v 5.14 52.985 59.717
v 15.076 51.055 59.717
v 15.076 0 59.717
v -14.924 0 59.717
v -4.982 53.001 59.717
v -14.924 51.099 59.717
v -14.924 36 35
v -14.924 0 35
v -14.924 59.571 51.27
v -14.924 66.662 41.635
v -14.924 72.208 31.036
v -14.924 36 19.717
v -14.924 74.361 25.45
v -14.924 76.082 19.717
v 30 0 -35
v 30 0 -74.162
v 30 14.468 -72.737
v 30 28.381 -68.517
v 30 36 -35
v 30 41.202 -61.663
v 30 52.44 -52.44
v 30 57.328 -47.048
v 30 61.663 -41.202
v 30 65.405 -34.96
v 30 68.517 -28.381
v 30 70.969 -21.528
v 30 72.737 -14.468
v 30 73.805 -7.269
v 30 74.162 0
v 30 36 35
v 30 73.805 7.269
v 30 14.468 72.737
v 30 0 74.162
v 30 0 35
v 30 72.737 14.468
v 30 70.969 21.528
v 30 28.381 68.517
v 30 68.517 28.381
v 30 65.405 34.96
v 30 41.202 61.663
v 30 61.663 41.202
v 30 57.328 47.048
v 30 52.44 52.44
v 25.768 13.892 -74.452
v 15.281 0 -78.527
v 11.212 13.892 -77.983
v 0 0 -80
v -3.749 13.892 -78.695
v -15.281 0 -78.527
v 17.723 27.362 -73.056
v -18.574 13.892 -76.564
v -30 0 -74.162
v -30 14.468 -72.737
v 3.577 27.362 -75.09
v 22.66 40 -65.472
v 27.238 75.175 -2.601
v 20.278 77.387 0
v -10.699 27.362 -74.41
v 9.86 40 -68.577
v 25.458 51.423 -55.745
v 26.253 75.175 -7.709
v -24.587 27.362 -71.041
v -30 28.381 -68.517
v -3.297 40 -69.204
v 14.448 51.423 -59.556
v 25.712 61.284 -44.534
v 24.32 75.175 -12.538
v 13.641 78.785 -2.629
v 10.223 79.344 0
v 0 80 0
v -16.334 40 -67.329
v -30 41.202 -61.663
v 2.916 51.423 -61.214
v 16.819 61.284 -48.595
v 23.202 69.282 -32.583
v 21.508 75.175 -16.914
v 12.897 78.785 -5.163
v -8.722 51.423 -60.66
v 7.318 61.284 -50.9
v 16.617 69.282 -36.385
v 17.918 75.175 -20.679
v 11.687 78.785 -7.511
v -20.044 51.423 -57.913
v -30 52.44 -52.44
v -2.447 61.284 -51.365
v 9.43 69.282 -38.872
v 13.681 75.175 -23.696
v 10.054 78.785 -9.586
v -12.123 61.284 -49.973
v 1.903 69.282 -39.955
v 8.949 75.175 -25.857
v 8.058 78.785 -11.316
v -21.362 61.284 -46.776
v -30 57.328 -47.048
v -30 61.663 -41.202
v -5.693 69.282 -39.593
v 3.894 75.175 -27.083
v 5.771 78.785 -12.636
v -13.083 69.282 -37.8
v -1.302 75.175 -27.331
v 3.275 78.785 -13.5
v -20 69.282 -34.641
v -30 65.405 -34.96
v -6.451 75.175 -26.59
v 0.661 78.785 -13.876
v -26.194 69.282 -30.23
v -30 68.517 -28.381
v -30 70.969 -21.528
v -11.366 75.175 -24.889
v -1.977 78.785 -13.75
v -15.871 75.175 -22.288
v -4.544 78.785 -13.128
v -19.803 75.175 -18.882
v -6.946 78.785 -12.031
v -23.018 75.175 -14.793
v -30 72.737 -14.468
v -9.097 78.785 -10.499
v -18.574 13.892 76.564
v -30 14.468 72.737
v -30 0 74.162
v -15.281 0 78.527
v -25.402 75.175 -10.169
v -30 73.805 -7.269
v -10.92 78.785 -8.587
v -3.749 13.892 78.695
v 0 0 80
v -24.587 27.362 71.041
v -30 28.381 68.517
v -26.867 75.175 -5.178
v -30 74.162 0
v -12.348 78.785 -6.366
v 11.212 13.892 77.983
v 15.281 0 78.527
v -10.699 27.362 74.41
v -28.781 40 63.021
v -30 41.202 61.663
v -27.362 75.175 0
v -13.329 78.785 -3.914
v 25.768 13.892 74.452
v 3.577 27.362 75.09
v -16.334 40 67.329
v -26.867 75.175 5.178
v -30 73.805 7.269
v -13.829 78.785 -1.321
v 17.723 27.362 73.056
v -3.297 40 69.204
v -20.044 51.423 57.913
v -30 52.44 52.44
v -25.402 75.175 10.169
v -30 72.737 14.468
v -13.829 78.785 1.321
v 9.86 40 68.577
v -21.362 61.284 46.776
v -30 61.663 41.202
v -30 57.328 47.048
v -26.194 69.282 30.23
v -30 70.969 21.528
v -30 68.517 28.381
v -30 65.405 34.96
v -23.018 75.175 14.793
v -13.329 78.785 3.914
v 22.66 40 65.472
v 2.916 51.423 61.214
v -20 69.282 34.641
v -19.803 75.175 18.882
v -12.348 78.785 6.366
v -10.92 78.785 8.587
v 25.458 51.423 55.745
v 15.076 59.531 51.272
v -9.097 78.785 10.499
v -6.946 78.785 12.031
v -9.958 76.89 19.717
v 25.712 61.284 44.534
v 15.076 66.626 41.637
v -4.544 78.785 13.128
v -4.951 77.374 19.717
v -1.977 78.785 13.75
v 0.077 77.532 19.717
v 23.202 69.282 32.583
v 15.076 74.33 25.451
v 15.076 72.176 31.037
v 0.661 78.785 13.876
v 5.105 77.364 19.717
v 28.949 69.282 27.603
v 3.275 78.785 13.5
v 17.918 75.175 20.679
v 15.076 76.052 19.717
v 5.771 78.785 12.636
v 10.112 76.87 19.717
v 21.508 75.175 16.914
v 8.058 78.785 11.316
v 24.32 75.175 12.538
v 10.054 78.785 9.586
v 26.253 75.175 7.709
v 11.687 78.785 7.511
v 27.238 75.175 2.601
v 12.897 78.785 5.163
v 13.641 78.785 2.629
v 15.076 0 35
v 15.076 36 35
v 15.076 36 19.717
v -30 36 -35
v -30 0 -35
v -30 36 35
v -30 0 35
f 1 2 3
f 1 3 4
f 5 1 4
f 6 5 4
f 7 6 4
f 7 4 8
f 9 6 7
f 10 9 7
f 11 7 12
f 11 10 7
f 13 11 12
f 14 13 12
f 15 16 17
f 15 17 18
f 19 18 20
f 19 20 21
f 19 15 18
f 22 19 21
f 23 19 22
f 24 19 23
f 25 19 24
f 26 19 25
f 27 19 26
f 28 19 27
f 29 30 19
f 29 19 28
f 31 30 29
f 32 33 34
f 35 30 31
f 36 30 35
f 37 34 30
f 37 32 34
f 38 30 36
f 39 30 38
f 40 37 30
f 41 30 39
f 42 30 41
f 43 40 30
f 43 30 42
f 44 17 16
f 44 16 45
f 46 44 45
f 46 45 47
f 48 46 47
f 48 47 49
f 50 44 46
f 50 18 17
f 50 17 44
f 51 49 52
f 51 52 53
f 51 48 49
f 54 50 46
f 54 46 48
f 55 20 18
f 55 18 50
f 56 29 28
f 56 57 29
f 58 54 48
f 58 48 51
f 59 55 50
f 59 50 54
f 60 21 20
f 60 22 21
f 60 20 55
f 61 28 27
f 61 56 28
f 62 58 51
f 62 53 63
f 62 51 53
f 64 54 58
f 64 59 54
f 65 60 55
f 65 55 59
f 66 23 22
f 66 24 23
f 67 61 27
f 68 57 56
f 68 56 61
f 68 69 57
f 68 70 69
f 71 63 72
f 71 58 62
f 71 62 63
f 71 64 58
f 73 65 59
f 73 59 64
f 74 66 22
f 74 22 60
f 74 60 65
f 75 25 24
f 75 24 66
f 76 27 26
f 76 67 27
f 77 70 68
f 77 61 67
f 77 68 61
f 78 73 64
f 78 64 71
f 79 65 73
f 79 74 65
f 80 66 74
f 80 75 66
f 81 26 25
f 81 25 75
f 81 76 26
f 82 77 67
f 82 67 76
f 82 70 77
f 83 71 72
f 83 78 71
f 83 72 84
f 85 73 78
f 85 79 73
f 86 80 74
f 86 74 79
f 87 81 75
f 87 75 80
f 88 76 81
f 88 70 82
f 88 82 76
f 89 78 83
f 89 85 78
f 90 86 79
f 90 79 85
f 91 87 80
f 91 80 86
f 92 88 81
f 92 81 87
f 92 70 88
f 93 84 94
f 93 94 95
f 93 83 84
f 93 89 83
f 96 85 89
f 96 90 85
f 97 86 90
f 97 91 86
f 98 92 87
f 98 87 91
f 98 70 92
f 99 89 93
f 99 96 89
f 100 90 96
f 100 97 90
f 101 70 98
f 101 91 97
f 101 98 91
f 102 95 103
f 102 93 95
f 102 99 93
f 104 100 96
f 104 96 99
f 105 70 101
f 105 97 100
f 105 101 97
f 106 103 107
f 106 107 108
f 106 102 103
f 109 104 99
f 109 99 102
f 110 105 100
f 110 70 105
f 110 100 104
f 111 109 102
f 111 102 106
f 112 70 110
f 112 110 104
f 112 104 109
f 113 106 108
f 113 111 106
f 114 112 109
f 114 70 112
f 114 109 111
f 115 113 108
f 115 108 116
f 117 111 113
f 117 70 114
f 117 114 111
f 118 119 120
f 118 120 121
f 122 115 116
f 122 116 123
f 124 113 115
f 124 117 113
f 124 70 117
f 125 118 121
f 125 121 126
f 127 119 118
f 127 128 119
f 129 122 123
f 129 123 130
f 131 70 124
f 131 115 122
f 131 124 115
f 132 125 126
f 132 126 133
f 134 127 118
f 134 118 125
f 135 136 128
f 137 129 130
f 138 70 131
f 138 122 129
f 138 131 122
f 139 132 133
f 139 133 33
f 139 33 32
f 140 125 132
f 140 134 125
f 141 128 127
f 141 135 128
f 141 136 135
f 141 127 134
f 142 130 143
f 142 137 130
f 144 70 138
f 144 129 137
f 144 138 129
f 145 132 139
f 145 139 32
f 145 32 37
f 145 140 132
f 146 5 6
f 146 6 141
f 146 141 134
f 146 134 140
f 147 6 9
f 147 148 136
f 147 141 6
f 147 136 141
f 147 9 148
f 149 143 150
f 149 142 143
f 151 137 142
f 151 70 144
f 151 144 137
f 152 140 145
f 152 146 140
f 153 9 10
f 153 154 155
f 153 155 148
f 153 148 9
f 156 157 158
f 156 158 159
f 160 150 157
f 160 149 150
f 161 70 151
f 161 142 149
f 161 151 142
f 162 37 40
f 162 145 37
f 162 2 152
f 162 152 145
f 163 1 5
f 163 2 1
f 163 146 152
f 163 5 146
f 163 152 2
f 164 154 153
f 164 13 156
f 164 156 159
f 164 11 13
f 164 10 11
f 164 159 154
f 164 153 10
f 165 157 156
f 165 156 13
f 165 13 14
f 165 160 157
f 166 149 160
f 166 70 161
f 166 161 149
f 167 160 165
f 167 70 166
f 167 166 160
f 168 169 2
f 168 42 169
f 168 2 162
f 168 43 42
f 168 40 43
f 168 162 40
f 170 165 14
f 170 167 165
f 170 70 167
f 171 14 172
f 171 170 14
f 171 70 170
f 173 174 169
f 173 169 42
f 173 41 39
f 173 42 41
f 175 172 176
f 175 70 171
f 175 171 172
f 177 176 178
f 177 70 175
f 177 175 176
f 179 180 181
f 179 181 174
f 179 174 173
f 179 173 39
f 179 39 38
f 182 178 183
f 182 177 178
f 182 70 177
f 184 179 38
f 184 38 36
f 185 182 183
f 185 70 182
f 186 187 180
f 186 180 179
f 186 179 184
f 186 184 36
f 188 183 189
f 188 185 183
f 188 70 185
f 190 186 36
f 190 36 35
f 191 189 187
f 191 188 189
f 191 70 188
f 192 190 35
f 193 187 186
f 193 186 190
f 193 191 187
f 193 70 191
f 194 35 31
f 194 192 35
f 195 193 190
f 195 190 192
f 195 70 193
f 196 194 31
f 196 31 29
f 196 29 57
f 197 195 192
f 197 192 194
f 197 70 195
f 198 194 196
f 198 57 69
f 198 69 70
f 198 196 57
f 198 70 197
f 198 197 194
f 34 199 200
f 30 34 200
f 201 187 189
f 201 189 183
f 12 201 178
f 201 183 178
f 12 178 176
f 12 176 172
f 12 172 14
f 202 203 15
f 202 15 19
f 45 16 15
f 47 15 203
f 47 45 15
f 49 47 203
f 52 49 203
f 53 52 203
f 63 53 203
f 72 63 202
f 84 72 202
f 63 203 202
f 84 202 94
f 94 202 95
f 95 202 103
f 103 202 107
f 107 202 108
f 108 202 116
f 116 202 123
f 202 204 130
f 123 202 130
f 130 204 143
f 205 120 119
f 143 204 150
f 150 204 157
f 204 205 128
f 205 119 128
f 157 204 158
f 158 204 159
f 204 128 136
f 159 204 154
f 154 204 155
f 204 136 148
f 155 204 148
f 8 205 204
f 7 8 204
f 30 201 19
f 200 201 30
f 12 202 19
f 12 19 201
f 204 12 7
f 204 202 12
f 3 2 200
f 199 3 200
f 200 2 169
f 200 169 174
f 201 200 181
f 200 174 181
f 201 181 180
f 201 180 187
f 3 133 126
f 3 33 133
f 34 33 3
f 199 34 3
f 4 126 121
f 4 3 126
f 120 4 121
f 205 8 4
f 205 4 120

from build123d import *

# Parameters (mm, degrees)
SKETCH2_W          = 50
SKETCH2_H          = 80
CUT_EXTRUDE1_DEPTH = 196.959179423
SKETCH3_W          = 70
SKETCH3_H          = 36
CUT_EXTRUDE2_DEPTH = 129.062484749
SKETCH5_W          = 30
SKETCH5_H          = 40
CUT_EXTRUDE3_DEPTH = 118.046999107


with BuildPart() as part:
    # Sketch1 → Revolve2 (revolve)
    with BuildSketch(Plane.XY):
        with BuildLine():
            Line((0, 0), (80, 0))
            ThreePointArc((80, 0), (56.568542495, 56.568542495), (0, 80))
            Line((0, 80), (0, 0))
        make_face()
    revolve(axis=Axis((0, 0, 0), (0, 1, 0)))

    # Sketch2 → Cut-Extrude1 (cut, through all)
    with BuildSketch(Plane.XY.offset(80)):
        with Locations((55, 40)):
            Rectangle(SKETCH2_W, SKETCH2_H)
        with Locations((-55, 40)):
            Rectangle(SKETCH2_W, SKETCH2_H)
    extrude(amount=-CUT_EXTRUDE1_DEPTH, mode=Mode.SUBTRACT)

    # Sketch3 → Cut-Extrude2 (cut, through all)
    with BuildSketch(Plane.ZY.offset(30)):
        with Locations((0, 18)):
            Rectangle(SKETCH3_W, SKETCH3_H)
    extrude(amount=-CUT_EXTRUDE2_DEPTH, mode=Mode.SUBTRACT)

    # Sketch5 → Cut-Extrude3 (cut, through all)
    with BuildSketch(Plane(origin=(0, 80, 0), x_dir=(-1, 0, 0), z_dir=(0, -1, 0))):
        with Locations((-0.075942229, -39.717020611)):
            Rectangle(SKETCH5_W, SKETCH5_H)
    extrude(amount=CUT_EXTRUDE3_DEPTH, mode=Mode.SUBTRACT)


solid = part.part
